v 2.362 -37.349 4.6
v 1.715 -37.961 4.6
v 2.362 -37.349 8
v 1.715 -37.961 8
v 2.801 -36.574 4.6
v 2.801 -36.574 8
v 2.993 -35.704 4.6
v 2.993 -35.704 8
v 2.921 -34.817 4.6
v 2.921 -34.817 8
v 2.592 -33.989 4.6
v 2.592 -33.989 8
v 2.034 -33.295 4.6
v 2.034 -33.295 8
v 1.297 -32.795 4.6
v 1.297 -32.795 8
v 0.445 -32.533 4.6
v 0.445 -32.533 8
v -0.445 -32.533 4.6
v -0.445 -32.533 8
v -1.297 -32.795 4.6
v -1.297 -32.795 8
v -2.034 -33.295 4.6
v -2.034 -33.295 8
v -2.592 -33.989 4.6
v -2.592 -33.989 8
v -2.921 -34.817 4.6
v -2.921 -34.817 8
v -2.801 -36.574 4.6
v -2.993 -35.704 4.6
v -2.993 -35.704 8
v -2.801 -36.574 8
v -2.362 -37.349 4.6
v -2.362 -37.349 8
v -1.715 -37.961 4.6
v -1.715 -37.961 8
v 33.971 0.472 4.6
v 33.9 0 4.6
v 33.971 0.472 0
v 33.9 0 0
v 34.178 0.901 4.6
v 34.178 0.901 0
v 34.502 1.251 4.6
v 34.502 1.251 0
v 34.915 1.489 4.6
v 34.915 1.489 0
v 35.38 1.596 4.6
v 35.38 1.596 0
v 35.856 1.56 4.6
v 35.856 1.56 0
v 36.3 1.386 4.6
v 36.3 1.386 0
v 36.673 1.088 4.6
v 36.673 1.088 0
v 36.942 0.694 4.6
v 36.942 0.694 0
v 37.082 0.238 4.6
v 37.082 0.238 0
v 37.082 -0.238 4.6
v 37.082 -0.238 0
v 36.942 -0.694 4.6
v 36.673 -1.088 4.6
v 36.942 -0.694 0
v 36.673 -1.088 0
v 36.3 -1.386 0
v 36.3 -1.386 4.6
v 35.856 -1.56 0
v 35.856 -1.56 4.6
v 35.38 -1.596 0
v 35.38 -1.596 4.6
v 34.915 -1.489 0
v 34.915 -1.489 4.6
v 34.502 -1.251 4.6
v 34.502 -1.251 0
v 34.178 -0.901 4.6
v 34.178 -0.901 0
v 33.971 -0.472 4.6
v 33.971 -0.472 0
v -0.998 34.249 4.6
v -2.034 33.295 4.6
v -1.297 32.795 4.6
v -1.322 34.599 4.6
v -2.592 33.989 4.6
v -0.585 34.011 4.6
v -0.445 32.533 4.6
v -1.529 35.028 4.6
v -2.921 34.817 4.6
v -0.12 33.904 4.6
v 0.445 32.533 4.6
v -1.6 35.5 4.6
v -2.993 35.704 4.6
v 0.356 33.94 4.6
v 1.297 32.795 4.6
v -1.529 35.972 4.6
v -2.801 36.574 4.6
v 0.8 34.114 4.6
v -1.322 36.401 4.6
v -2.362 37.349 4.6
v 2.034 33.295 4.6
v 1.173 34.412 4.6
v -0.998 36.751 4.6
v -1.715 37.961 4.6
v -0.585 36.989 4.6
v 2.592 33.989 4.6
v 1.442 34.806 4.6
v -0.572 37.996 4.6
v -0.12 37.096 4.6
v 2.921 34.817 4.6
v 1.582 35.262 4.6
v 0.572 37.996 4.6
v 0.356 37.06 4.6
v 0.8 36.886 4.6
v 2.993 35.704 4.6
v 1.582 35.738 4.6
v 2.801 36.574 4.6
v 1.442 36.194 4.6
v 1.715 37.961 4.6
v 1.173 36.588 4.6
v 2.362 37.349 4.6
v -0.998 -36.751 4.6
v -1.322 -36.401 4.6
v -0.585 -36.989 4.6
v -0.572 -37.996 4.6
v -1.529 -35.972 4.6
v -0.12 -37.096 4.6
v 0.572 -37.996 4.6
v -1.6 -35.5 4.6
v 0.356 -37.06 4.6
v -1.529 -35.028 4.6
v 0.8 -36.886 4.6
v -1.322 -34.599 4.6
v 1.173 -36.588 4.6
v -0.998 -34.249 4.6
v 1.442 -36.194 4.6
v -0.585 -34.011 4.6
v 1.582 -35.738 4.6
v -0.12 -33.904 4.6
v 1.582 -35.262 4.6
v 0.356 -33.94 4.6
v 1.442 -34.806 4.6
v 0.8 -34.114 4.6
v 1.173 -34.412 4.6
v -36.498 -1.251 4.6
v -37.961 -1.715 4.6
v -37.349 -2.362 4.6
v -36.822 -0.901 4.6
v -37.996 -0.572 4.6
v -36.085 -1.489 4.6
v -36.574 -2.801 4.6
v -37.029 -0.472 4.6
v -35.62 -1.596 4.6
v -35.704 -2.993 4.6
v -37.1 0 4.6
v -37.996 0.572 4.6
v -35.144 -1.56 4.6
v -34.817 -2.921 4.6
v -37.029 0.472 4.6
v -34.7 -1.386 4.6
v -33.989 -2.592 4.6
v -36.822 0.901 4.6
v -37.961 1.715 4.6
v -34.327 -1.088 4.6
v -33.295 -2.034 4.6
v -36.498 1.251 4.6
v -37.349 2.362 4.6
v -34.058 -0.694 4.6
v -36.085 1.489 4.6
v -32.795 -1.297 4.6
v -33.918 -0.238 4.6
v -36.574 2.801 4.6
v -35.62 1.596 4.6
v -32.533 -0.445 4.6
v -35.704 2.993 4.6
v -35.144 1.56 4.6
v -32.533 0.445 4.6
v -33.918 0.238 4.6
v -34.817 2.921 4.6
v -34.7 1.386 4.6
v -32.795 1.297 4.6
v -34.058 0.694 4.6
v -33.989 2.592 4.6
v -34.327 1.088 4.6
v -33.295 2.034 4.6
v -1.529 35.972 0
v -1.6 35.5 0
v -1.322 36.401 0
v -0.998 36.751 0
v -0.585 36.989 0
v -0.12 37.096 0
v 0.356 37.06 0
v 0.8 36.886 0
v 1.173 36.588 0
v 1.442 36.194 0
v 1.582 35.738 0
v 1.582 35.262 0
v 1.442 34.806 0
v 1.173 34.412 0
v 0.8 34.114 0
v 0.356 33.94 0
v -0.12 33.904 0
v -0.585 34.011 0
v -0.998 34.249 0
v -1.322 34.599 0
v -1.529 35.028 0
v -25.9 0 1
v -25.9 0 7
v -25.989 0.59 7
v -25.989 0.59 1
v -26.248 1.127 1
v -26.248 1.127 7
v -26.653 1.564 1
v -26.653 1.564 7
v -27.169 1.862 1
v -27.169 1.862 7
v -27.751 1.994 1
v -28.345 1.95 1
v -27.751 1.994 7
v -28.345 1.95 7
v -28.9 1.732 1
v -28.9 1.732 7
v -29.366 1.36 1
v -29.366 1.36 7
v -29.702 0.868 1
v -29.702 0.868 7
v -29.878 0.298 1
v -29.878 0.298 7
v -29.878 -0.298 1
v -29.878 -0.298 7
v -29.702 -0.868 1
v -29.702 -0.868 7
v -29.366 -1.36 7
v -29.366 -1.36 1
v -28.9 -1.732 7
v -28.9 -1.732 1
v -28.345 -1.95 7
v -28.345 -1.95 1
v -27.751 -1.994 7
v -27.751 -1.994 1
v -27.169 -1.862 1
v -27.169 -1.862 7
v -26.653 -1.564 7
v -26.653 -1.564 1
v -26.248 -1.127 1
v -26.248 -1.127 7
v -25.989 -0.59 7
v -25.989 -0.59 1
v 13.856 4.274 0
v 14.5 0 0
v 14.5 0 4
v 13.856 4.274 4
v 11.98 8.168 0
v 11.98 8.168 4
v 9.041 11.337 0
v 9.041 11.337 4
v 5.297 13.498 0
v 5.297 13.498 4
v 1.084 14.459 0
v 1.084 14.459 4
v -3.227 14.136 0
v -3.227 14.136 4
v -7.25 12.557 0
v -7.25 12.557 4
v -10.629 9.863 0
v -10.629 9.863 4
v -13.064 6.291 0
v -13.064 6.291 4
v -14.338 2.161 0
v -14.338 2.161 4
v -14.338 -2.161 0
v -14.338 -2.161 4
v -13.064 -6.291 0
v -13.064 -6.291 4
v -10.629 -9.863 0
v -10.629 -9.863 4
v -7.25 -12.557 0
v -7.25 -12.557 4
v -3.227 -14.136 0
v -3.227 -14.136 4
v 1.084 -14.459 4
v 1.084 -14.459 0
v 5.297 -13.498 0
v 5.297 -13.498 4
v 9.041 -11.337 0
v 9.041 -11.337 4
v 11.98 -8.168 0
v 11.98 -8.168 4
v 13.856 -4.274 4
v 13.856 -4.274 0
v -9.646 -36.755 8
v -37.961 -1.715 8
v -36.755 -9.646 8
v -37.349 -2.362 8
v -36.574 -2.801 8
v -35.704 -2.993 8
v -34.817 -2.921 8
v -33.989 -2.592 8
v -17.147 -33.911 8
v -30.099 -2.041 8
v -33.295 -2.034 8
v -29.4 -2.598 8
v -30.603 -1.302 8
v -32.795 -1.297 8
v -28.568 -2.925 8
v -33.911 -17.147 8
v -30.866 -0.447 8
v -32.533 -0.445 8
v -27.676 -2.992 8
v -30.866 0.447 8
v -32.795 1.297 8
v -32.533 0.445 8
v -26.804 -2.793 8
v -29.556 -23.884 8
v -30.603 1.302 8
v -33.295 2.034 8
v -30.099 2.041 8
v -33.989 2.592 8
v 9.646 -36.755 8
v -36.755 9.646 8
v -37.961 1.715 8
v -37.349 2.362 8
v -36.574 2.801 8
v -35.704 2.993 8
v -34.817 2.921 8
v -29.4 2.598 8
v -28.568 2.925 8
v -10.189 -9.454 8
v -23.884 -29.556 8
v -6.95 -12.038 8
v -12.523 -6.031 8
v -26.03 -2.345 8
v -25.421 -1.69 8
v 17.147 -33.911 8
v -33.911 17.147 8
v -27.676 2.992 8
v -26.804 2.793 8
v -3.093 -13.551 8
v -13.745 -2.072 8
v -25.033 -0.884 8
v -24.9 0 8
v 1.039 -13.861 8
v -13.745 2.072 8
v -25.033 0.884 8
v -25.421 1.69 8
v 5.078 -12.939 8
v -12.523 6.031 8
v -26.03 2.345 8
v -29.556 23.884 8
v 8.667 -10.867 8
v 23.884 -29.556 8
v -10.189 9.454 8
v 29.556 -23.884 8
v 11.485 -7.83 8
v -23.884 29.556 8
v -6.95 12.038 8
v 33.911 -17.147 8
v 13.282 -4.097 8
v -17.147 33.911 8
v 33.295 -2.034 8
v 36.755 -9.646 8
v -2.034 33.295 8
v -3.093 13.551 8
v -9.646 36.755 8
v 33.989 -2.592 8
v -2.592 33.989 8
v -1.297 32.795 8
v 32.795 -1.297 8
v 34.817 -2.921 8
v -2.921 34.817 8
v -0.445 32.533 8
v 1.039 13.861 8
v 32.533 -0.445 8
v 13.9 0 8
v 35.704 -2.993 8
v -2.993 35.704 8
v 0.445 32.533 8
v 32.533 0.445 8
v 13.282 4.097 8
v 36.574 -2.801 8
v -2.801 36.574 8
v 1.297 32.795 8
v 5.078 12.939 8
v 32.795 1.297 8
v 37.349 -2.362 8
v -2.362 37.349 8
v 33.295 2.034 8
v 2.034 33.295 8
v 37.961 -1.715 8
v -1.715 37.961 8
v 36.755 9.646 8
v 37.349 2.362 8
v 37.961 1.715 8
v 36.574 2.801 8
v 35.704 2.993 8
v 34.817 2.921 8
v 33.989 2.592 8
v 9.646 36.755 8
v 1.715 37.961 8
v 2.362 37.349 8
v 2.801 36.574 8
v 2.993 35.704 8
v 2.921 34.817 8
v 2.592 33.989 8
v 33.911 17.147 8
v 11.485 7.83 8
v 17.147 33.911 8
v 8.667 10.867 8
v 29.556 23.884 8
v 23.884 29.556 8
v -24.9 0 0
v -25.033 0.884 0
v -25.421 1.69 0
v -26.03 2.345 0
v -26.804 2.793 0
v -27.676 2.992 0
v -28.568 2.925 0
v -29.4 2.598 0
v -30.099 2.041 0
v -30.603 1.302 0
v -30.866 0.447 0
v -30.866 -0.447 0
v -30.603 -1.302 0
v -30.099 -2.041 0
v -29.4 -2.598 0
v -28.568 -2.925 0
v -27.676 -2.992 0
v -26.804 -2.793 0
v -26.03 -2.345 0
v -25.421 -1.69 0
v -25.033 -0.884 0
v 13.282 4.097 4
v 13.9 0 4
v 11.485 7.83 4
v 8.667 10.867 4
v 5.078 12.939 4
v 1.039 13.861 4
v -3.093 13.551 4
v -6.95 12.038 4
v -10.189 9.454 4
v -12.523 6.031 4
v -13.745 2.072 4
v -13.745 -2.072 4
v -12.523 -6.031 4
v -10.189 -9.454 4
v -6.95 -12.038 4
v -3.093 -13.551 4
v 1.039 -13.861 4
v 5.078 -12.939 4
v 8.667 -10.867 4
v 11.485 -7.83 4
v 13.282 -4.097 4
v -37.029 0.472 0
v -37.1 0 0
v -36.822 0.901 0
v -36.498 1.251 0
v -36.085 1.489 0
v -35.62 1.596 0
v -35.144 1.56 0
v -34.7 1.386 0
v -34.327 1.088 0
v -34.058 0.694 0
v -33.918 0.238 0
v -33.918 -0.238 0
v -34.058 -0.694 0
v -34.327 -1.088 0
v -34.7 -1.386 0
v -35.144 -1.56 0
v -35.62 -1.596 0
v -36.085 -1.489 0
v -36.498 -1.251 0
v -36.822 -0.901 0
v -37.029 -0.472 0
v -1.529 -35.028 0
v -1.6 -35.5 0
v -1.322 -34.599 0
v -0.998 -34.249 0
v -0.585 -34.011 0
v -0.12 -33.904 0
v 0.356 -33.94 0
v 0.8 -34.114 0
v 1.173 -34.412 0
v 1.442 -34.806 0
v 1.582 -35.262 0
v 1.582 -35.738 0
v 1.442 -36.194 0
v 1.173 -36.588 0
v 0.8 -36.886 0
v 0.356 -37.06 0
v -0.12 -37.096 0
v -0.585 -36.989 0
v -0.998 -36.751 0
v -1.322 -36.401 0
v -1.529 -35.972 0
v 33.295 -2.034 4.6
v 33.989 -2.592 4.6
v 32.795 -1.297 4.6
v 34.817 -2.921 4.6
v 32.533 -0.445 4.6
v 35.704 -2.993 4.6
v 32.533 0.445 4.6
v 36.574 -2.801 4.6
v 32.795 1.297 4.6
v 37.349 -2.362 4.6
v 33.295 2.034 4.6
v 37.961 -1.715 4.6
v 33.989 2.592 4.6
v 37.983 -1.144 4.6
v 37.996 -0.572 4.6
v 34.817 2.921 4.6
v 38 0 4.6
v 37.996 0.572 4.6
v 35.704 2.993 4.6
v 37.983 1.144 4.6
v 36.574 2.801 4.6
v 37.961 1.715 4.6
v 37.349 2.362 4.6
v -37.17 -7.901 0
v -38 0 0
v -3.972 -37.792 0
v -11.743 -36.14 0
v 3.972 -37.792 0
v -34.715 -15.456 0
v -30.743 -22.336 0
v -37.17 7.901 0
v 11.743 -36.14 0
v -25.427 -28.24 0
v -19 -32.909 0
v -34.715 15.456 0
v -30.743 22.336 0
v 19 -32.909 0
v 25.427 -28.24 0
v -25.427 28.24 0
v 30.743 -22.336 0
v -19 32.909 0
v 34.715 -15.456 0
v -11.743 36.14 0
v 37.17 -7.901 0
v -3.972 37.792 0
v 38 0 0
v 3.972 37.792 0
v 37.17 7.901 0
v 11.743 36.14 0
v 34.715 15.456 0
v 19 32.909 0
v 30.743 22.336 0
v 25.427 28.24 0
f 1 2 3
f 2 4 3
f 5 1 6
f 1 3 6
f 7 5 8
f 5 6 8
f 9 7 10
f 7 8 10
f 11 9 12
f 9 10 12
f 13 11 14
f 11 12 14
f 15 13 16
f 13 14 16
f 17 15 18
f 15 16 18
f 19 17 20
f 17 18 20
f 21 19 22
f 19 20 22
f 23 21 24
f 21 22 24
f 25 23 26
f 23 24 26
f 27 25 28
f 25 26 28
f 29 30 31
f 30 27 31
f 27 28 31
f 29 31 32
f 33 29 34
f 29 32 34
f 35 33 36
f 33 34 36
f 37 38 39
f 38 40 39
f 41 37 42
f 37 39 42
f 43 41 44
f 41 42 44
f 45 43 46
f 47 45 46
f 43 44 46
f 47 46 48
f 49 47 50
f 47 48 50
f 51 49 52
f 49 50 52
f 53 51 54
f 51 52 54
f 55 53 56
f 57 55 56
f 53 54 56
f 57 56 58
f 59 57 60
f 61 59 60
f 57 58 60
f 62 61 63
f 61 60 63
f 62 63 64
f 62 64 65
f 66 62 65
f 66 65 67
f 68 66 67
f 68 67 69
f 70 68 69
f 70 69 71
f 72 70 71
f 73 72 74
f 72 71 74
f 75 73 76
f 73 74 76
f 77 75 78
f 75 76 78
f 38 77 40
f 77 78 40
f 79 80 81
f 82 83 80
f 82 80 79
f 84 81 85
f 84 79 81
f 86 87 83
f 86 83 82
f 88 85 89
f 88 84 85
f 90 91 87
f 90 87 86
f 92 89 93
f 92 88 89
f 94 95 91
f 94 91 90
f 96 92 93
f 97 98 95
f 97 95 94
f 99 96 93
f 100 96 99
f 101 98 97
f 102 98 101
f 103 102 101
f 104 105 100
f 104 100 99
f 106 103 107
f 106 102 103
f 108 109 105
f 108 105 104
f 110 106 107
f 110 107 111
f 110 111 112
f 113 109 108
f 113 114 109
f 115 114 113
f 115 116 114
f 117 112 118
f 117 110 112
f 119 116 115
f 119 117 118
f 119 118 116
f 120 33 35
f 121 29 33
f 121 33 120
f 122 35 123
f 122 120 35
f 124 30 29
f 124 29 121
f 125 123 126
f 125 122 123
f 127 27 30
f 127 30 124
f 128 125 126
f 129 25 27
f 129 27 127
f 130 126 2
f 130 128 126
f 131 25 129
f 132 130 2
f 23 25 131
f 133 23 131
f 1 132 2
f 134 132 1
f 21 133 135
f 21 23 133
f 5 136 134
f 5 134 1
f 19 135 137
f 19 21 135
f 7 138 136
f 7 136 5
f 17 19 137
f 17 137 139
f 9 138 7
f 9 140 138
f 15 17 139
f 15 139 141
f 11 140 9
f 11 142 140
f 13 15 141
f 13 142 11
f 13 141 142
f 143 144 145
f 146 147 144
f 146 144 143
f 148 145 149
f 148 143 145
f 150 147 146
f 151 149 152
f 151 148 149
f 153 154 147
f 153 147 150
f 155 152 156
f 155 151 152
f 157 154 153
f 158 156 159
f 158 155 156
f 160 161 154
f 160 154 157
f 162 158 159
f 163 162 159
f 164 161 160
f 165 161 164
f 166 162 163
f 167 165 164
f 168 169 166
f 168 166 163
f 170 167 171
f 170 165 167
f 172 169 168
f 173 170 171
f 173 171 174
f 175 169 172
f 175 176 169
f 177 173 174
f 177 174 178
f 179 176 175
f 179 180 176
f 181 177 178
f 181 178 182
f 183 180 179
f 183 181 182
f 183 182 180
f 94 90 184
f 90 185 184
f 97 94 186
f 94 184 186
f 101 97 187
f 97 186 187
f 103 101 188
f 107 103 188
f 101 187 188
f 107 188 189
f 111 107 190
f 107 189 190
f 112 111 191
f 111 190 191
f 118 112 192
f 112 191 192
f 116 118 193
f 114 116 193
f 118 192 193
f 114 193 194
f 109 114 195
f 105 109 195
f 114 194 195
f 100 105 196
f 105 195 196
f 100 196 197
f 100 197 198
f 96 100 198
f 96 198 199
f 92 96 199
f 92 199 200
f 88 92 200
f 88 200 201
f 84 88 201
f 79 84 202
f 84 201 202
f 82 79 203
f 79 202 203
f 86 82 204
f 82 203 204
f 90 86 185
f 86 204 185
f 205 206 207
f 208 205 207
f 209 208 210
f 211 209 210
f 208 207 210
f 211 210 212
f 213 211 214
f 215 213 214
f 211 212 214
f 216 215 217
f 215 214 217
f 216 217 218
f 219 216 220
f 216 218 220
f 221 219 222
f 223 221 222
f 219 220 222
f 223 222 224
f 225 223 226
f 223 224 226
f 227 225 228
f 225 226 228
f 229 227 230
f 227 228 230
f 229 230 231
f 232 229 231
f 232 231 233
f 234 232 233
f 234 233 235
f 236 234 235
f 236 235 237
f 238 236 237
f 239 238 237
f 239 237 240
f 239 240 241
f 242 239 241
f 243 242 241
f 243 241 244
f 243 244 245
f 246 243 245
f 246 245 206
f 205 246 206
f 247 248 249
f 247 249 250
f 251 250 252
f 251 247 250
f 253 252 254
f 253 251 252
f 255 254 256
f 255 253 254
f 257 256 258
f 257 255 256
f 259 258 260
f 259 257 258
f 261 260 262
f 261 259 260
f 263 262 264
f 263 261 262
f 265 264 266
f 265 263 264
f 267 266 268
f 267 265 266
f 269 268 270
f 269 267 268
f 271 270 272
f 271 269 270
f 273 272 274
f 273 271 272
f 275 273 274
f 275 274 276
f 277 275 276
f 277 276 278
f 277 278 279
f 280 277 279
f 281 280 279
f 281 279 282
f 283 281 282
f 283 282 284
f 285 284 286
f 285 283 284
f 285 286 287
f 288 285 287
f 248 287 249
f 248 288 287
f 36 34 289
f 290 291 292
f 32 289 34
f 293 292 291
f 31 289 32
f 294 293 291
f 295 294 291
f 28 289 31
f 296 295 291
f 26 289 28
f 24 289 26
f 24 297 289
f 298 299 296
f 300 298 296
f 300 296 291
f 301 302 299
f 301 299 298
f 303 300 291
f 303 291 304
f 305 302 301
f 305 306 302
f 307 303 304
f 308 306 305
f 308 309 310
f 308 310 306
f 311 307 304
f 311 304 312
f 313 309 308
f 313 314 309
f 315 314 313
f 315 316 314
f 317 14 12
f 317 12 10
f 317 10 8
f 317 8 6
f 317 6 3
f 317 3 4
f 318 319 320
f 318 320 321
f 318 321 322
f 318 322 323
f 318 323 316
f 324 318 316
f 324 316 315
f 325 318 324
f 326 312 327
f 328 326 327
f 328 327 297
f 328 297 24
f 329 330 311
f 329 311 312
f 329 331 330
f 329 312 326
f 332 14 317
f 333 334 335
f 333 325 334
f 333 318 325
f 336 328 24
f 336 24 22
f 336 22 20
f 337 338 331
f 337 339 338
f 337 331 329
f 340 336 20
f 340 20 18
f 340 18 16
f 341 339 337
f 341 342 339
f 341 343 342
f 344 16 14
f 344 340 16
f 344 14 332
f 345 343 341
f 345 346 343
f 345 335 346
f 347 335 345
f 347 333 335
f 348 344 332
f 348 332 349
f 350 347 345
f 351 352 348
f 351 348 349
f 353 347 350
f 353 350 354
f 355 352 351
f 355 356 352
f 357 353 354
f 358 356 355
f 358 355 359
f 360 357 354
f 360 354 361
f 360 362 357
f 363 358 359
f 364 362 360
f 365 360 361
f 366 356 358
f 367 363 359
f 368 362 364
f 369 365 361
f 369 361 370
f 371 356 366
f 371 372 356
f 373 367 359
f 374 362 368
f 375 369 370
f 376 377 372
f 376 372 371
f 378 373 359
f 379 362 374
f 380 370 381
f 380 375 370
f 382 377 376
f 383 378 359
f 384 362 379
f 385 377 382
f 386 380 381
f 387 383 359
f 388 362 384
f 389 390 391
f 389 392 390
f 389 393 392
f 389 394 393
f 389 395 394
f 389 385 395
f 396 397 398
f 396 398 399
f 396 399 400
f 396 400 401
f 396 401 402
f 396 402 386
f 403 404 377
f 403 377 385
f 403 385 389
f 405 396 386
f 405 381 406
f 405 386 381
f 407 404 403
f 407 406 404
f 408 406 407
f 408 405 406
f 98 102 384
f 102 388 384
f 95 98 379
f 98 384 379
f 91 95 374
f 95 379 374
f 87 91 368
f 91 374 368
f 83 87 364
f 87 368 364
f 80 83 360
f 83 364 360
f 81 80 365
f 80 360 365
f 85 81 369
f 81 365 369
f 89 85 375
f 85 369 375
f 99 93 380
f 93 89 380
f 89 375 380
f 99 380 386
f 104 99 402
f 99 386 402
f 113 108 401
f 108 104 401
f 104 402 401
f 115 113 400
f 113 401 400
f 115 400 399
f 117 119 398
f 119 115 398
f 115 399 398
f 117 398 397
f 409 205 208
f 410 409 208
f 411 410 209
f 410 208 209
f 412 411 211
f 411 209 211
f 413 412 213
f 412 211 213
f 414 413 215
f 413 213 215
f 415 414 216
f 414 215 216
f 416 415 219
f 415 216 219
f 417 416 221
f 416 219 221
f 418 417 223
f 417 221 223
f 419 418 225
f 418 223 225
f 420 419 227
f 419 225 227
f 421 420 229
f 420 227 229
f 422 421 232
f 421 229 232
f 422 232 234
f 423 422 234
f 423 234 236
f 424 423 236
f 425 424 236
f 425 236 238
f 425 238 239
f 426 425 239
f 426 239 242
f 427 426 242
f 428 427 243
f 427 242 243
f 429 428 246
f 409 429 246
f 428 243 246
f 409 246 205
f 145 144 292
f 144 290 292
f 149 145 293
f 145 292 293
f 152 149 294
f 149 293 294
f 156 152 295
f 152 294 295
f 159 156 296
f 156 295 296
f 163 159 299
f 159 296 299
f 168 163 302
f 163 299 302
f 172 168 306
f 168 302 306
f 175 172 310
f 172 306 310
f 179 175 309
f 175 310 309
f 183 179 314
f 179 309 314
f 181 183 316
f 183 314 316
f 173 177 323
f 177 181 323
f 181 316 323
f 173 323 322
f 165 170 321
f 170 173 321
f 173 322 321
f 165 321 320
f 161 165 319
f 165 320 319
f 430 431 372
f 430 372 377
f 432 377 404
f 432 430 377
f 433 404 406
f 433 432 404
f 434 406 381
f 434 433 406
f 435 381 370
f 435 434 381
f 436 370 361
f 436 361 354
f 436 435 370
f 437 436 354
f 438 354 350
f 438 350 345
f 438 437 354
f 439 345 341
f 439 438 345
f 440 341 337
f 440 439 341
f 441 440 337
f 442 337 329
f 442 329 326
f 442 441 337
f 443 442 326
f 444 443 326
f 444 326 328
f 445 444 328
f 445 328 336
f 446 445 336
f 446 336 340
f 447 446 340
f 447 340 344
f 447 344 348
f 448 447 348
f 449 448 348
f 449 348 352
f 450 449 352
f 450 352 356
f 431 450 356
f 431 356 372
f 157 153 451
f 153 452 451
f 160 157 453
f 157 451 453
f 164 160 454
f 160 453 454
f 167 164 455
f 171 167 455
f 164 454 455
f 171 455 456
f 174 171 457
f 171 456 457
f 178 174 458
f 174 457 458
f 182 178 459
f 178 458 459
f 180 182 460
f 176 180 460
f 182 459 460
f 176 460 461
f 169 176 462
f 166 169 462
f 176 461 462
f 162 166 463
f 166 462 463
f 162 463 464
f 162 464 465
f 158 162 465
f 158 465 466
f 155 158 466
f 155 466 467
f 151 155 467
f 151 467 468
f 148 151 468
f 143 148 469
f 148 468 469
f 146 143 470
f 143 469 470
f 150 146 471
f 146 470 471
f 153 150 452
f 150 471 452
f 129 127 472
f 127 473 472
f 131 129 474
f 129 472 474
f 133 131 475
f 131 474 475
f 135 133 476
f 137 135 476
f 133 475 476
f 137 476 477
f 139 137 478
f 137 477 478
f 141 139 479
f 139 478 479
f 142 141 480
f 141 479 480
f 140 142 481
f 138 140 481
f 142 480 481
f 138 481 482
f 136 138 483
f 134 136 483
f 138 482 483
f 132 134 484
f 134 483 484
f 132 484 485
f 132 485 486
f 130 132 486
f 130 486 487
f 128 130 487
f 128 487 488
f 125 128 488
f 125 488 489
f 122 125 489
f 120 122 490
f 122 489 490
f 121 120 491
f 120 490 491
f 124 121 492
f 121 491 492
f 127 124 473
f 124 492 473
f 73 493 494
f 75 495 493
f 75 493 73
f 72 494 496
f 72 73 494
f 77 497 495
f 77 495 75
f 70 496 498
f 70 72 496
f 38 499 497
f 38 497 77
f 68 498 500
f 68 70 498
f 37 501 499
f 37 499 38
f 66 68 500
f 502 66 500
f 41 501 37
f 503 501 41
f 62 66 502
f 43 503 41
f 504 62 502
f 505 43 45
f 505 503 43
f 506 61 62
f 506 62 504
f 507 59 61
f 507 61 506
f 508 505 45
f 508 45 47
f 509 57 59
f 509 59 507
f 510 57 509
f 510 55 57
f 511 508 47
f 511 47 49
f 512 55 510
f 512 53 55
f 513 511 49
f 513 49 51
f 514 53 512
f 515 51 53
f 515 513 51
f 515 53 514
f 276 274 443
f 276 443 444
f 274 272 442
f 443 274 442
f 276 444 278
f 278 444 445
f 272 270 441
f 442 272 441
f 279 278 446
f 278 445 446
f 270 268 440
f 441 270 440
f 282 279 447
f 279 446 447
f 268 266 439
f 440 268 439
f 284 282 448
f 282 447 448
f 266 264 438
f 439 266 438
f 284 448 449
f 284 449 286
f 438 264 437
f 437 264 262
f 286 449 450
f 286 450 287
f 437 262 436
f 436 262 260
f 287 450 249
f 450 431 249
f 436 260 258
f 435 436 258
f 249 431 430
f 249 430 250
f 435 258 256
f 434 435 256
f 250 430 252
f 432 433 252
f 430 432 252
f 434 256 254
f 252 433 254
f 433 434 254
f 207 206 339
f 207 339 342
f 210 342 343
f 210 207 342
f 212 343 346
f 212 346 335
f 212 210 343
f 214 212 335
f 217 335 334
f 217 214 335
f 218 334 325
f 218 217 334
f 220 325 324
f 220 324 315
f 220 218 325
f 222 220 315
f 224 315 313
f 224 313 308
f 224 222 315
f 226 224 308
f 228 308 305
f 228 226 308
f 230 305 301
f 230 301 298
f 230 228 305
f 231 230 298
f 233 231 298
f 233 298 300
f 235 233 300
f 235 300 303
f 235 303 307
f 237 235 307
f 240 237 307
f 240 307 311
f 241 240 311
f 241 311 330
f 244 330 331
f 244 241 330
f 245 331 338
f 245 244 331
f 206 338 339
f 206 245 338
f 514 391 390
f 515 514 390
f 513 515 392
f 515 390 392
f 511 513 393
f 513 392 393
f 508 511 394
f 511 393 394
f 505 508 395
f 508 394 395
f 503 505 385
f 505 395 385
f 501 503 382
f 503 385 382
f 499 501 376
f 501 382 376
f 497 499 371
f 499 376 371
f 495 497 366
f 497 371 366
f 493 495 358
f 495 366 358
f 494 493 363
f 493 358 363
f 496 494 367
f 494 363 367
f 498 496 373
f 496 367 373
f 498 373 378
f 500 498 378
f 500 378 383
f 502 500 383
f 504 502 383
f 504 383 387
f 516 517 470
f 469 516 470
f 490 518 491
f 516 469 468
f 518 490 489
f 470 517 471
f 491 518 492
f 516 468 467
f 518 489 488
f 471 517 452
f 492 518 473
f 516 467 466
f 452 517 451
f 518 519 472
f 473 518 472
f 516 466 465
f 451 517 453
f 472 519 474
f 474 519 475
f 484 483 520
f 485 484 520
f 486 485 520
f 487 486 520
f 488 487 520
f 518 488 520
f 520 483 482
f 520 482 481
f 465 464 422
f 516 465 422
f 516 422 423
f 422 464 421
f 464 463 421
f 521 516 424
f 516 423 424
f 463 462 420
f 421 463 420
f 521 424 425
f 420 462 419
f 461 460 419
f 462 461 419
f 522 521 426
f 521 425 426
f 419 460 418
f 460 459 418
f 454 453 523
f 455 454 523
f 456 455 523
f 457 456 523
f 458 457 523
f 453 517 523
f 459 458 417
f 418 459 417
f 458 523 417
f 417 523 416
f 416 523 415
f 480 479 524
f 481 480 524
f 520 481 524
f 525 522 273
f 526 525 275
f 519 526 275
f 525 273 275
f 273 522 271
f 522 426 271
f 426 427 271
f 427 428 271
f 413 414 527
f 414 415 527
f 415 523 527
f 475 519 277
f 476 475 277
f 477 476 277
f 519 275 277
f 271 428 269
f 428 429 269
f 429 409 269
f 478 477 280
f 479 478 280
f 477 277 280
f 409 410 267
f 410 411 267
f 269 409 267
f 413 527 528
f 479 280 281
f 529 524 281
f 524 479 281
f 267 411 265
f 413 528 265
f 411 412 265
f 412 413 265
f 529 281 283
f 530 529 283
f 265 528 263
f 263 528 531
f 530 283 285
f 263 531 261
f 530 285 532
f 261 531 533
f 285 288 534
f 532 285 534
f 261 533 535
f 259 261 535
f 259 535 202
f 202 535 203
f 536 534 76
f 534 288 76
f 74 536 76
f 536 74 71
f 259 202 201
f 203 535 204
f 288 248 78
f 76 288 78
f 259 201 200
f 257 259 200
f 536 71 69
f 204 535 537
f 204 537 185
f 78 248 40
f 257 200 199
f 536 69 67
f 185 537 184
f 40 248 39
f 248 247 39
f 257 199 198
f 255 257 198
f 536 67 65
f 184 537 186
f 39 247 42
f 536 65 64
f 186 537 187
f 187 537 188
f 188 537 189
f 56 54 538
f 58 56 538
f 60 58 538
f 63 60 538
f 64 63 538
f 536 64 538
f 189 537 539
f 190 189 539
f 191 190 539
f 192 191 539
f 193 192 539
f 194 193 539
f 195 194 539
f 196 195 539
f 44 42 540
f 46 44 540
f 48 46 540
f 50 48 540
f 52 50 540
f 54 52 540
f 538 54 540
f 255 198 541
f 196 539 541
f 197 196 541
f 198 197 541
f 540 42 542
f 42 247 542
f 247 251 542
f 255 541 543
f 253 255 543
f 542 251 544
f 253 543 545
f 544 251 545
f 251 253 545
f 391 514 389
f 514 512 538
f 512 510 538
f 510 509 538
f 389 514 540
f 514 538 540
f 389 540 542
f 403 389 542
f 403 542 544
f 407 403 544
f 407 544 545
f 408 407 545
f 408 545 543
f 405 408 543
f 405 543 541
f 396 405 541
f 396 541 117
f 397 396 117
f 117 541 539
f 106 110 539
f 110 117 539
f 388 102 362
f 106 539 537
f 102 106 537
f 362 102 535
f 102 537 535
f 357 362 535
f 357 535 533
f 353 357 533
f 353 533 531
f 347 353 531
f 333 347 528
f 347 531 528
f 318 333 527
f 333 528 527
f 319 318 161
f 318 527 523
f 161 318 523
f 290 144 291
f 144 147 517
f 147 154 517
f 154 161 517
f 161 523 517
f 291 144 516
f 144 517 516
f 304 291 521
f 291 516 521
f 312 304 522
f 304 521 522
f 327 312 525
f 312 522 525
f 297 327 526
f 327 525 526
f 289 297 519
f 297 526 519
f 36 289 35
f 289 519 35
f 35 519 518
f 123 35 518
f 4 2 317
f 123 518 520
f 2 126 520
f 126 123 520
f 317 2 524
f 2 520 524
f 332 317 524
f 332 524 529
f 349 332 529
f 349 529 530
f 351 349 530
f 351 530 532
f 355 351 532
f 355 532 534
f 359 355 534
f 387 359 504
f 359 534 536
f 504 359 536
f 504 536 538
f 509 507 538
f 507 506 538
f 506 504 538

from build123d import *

# Parameters (mm, degrees)
SKETCH_1_R                = 38
SKETCH_1_R_2              = 13.9
EXTRUDE_1_DEPTH           = 8
HOLE_WIZARD_1_D           = 3.2
HOLE_WIZARD_1_CBORE_D     = 6
HOLE_WIZARD_1_CBORE_DEPTH = 3.4
HOLE_WIZARD_4_0_4_1_D     = 4
CHAMFER_1_SIZE            = 1
SKETCH_9_R                = 14.5
CUT_EXTRUDE_1_DEPTH       = 4


with BuildPart() as part:
    # 草图1 → 凸台-拉伸1 (new body)
    with BuildSketch(Plane.XY):
        Circle(SKETCH_1_R)
        Circle(SKETCH_1_R_2, mode=Mode.SUBTRACT)
    extrude(amount=EXTRUDE_1_DEPTH)

    # 打孔尺寸(%根据)内六角圆柱头螺钉的类型1 (through all)
    with Locations(Plane.XY.offset(8)):
        with Locations((0, 35.5), (35.5, 0), (0, -35.5), (-35.5, 0)):
            CounterBoreHole(HOLE_WIZARD_1_D / 2, HOLE_WIZARD_1_CBORE_D / 2, HOLE_WIZARD_1_CBORE_DEPTH)

    # Ø4.0 (4) 直径孔1 (through all)
    with Locations(Plane(origin=(0, 0, 0), x_dir=(-1, 0, 0), z_dir=(0, 0, -1))):
        with Locations((27.9, 0)):
            Hole(HOLE_WIZARD_4_0_4_1_D / 2)

    # 倒角1
    chamfer_1_edges = [part.edges().sort_by_distance(p)[0] for p in [
        (-29.9, 0, 0),
        (-29.9, 0, 8),
    ]]
    chamfer(chamfer_1_edges, length=CHAMFER_1_SIZE)

    # 草图9 → 切除-拉伸1 (cut)
    with BuildSketch(Plane.XY):
        Circle(SKETCH_9_R)
    extrude(amount=CUT_EXTRUDE_1_DEPTH, mode=Mode.SUBTRACT)


solid = part.part
